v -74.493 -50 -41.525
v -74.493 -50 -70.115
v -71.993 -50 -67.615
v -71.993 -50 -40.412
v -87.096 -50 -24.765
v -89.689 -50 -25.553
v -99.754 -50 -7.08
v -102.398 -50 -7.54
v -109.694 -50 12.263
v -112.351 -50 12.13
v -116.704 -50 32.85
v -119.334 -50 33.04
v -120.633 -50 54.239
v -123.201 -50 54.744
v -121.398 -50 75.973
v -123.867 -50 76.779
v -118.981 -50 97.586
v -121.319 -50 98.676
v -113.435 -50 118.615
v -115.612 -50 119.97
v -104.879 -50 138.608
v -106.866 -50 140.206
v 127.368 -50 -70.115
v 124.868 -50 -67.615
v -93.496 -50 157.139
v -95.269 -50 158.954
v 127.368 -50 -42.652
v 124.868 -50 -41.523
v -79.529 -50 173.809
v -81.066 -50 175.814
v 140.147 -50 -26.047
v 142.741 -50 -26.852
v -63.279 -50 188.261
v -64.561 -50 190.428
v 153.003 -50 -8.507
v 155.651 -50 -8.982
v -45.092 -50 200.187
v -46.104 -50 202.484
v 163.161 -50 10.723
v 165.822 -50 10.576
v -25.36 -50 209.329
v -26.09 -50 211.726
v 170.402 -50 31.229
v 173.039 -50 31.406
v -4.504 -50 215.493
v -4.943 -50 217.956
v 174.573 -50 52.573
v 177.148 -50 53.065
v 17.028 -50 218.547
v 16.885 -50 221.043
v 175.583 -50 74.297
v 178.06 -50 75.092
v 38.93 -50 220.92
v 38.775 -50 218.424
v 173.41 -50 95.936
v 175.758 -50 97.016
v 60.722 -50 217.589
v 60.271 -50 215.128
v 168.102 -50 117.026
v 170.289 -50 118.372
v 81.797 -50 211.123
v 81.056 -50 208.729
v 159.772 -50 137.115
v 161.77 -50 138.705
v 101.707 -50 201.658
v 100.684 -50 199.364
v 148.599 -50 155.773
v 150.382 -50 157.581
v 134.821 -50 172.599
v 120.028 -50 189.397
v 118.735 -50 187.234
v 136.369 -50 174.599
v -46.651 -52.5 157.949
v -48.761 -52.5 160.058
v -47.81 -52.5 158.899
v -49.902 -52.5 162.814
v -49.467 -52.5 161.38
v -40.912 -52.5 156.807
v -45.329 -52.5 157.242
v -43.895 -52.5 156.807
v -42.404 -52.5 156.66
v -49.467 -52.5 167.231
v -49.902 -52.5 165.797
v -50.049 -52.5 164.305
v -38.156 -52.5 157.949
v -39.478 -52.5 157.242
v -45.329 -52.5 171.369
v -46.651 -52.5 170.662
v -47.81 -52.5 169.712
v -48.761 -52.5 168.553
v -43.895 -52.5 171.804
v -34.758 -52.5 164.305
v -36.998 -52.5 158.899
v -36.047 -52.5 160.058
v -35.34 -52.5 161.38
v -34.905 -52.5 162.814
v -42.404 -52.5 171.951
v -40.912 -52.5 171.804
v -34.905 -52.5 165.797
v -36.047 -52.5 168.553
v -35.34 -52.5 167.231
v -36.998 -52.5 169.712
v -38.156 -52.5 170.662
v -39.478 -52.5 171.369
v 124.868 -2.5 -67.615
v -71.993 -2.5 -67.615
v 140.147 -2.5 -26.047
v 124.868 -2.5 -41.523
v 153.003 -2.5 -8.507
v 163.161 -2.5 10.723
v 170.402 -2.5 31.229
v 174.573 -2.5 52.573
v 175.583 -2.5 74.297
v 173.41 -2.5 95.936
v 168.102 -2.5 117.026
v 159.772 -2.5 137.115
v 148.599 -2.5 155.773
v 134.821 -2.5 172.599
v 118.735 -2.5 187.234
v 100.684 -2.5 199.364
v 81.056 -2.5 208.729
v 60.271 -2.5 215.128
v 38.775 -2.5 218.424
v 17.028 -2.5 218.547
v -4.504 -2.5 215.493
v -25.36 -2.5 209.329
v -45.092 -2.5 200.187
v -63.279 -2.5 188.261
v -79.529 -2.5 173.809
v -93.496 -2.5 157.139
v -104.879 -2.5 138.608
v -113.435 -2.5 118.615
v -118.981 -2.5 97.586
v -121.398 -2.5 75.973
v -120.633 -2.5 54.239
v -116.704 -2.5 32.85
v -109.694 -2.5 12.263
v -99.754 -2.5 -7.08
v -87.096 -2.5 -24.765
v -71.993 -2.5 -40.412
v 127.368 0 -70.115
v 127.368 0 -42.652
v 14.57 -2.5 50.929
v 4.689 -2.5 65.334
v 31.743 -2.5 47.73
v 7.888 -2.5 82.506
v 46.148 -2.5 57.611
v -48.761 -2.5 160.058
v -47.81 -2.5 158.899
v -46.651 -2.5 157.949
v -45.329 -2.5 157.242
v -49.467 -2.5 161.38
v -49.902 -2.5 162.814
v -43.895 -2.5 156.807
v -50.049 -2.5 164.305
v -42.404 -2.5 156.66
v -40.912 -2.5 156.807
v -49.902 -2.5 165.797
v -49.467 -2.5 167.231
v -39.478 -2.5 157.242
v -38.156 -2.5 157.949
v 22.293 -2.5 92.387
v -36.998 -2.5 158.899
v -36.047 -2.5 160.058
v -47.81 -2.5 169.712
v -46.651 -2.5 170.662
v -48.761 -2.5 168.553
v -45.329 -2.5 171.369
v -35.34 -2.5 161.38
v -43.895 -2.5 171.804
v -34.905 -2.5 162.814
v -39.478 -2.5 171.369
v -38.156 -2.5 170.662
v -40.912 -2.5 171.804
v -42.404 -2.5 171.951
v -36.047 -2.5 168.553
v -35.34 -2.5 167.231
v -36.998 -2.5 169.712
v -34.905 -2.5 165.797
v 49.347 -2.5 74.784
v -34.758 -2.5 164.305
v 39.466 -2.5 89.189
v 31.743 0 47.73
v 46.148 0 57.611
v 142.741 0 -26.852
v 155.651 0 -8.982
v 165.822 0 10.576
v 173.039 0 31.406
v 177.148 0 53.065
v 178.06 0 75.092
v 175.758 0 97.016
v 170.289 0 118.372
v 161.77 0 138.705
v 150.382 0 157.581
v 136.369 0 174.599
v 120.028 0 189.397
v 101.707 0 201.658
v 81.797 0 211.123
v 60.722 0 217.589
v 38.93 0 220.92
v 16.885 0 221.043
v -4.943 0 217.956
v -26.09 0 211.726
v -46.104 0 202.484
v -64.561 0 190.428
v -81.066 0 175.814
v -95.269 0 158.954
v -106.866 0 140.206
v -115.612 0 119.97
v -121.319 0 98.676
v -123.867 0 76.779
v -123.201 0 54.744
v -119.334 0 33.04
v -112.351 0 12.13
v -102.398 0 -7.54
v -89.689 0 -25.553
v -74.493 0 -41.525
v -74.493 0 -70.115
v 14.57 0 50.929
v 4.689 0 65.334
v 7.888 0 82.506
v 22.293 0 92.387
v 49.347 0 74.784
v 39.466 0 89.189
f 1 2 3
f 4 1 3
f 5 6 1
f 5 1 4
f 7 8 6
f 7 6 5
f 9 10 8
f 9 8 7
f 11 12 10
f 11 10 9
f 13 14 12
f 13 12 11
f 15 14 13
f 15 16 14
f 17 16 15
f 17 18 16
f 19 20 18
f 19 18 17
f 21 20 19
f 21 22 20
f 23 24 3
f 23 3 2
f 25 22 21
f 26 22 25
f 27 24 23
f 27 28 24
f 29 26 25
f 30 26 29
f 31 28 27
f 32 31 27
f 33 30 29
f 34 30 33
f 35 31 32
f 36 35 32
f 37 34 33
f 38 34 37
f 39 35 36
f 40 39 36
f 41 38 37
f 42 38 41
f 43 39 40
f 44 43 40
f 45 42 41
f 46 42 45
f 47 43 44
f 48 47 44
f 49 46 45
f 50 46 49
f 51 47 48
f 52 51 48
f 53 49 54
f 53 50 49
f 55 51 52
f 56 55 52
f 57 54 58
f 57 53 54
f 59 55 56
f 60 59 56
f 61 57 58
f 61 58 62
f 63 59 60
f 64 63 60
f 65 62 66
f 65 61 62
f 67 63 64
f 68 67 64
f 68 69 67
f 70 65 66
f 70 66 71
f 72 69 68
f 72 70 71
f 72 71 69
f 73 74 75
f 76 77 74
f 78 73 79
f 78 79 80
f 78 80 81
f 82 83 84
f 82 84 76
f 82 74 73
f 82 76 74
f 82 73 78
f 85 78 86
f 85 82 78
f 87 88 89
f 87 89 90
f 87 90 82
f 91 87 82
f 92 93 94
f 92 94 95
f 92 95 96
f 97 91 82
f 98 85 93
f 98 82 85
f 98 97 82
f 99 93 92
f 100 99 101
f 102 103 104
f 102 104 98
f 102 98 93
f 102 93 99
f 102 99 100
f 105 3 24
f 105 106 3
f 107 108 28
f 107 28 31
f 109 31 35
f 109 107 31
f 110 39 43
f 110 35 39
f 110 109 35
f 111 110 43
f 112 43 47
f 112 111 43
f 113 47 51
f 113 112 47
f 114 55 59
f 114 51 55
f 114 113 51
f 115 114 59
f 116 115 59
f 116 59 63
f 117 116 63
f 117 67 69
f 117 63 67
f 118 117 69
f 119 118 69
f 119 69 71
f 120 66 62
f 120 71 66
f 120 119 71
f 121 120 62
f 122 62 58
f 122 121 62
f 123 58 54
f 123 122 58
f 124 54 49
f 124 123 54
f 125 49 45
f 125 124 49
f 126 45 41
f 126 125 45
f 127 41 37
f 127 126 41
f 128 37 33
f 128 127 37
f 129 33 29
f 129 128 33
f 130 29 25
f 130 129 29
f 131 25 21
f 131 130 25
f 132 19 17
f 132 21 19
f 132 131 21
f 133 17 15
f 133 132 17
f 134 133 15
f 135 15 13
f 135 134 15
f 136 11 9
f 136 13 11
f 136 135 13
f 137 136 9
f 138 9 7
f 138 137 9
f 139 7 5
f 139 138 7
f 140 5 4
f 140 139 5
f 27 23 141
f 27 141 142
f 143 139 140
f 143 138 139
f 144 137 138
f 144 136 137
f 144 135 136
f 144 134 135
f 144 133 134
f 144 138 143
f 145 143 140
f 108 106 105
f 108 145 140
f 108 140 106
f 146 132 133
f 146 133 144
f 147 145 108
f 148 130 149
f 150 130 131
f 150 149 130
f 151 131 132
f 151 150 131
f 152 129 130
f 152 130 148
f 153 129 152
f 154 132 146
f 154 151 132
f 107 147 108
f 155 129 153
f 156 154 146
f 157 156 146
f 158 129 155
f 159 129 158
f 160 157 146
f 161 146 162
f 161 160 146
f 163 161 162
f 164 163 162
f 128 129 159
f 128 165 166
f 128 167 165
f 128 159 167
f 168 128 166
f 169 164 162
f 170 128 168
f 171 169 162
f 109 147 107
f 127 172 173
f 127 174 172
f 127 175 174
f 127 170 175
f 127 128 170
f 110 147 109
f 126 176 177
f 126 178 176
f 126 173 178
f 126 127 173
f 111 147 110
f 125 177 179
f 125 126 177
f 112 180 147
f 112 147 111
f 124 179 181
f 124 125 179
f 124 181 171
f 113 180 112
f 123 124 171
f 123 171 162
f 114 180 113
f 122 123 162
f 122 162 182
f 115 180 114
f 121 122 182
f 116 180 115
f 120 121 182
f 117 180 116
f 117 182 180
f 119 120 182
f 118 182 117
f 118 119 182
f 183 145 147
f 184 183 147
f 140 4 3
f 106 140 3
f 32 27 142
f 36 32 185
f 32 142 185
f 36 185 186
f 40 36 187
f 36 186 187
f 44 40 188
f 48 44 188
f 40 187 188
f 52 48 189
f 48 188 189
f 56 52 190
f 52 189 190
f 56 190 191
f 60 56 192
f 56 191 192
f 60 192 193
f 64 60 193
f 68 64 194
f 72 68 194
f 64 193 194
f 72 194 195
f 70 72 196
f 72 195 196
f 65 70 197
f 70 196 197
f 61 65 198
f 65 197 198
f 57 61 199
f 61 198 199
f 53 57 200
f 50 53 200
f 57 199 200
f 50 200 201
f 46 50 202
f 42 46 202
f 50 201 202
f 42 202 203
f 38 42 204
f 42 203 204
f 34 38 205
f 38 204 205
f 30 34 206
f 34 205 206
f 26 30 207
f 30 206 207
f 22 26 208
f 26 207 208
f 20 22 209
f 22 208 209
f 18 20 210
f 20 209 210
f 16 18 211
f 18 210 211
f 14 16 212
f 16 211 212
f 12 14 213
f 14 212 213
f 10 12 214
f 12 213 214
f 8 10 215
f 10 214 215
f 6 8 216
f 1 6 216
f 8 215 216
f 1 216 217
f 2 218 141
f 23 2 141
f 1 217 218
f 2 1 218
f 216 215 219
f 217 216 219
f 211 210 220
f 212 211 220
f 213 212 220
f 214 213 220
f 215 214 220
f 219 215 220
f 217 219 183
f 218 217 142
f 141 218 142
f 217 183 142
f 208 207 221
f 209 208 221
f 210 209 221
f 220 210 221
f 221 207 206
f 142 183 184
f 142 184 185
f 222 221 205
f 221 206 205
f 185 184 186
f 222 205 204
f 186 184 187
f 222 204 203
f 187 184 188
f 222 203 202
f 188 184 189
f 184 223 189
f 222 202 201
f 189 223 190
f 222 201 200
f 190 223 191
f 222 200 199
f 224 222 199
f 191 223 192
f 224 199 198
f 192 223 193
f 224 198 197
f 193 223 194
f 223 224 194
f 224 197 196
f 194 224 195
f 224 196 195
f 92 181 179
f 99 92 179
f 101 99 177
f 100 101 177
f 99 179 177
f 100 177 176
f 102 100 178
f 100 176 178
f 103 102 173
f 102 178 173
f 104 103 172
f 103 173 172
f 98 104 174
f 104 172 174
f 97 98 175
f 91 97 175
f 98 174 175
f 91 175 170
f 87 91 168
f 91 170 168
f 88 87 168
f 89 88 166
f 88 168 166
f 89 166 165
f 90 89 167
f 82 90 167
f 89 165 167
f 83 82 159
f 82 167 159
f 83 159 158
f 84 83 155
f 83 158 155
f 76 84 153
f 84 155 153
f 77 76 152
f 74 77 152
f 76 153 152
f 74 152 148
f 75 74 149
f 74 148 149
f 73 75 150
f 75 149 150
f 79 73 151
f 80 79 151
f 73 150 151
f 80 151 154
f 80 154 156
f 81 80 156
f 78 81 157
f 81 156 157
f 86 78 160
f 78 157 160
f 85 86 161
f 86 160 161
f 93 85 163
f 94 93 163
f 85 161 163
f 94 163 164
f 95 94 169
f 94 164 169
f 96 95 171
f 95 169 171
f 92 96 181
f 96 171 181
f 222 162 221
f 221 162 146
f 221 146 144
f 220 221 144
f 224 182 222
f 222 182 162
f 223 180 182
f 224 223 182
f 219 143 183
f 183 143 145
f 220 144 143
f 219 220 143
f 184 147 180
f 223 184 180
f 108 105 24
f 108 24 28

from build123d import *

# Parameters (mm, degrees)
F0_R      = 38.1036206278
F1_DEPTH  = 25
F2_COUNT  = 24
F3_DEPTH  = 35
F4_R      = 5
F5_SIZE   = 5
F7_DEPTH  = 50
F8_T      = -2.5
F10_DEPTH = 25
F11_R     = 7.6453811345
F12_DEPTH = 50


with BuildPart() as f1:
    # F0 (on Front) → F1 (new body)
    with BuildSketch(Plane.XZ):
        with BuildLine():
            ThreePointArc((-7.8842675869, 53.139290225), (-35.0884247435, -40.6785974441), (53.721, 0))
            ThreePointArc((53.721, 0), (38.2966086664, 37.6738052983), (0.8807473744, 53.7137796572))
            ThreePointArc((0.8807473744, 53.7137796572), (-3.5135215054, 53.6059792153), (-7.8842675869, 53.139290225))
        make_face()
        Circle(F0_R, mode=Mode.SUBTRACT)
        with BuildLine():
            ThreePointArc((-7.8842675869, 53.139290225), (-3.5135215054, 53.6059792153), (0.8807473744, 53.7137796572))
            ThreePointArc((0.8807473744, 53.7137796572), (0.6904629861, 56.2382962215), (0, 58.674))
            ThreePointArc((0, 58.674), (-1.2045880723, 61.1890122015), (-2.8564405638, 63.4357213824))
            ThreePointArc((-2.8564405638, 63.4357213824), (-4.0797358778, 62.2447411623), (-5.448019844, 63.2658603022))
            ThreePointArc((-5.448019844, 63.2658603022), (-6.792486114, 60.822762014), (-7.6584938023, 58.1720357962))
            ThreePointArc((-7.6584938023, 58.1720357962), (-8.0251266423, 55.6670462968), (-7.8842675869, 53.139290225))
        make_face()
    extrude(amount=F1_DEPTH)


with BuildPart() as f2_1:
    # F2: instance of F1
    add(f1.part.rotate(Axis((0, 0, 0), (0, 1, 0)), 1 * 360 / F2_COUNT))


with BuildPart() as f2_2:
    # F2: instance of F1
    add(f1.part.rotate(Axis((0, 0, 0), (0, 1, 0)), 2 * 360 / F2_COUNT))


with BuildPart() as f2_3:
    # F2: instance of F1
    add(f1.part.rotate(Axis((0, 0, 0), (0, 1, 0)), 3 * 360 / F2_COUNT))


with BuildPart() as f2_4:
    # F2: instance of F1
    add(f1.part.rotate(Axis((0, 0, 0), (0, 1, 0)), 4 * 360 / F2_COUNT))


with BuildPart() as f2_5:
    # F2: instance of F1
    add(f1.part.rotate(Axis((0, 0, 0), (0, 1, 0)), 5 * 360 / F2_COUNT))


with BuildPart() as f2_6:
    # F2: instance of F1
    add(f1.part.rotate(Axis((0, 0, 0), (0, 1, 0)), 6 * 360 / F2_COUNT))


with BuildPart() as f2_7:
    # F2: instance of F1
    add(f1.part.rotate(Axis((0, 0, 0), (0, 1, 0)), 7 * 360 / F2_COUNT))


with BuildPart() as f2_8:
    # F2: instance of F1
    add(f1.part.rotate(Axis((0, 0, 0), (0, 1, 0)), 8 * 360 / F2_COUNT))


with BuildPart() as f2_9:
    # F2: instance of F1
    add(f1.part.rotate(Axis((0, 0, 0), (0, 1, 0)), 9 * 360 / F2_COUNT))


with BuildPart() as f2_10:
    # F2: instance of F1
    add(f1.part.rotate(Axis((0, 0, 0), (0, 1, 0)), 10 * 360 / F2_COUNT))


with BuildPart() as f2_11:
    # F2: instance of F1
    add(f1.part.rotate(Axis((0, 0, 0), (0, 1, 0)), 11 * 360 / F2_COUNT))


with BuildPart() as f2_12:
    # F2: instance of F1
    add(f1.part.rotate(Axis((0, 0, 0), (0, 1, 0)), 12 * 360 / F2_COUNT))


with BuildPart() as f2_13:
    # F2: instance of F1
    add(f1.part.rotate(Axis((0, 0, 0), (0, 1, 0)), 13 * 360 / F2_COUNT))


with BuildPart() as f2_14:
    # F2: instance of F1
    add(f1.part.rotate(Axis((0, 0, 0), (0, 1, 0)), 14 * 360 / F2_COUNT))


with BuildPart() as f2_15:
    # F2: instance of F1
    add(f1.part.rotate(Axis((0, 0, 0), (0, 1, 0)), 15 * 360 / F2_COUNT))


with BuildPart() as f2_16:
    # F2: instance of F1
    add(f1.part.rotate(Axis((0, 0, 0), (0, 1, 0)), 16 * 360 / F2_COUNT))


with BuildPart() as f2_17:
    # F2: instance of F1
    add(f1.part.rotate(Axis((0, 0, 0), (0, 1, 0)), 17 * 360 / F2_COUNT))


with BuildPart() as f2_18:
    # F2: instance of F1
    add(f1.part.rotate(Axis((0, 0, 0), (0, 1, 0)), 18 * 360 / F2_COUNT))


with BuildPart() as f2_19:
    # F2: instance of F1
    add(f1.part.rotate(Axis((0, 0, 0), (0, 1, 0)), 19 * 360 / F2_COUNT))


with BuildPart() as f2_20:
    # F2: instance of F1
    add(f1.part.rotate(Axis((0, 0, 0), (0, 1, 0)), 20 * 360 / F2_COUNT))


with BuildPart() as f2_21:
    # F2: instance of F1
    add(f1.part.rotate(Axis((0, 0, 0), (0, 1, 0)), 21 * 360 / F2_COUNT))


with BuildPart() as f2_22:
    # F2: instance of F1
    add(f1.part.rotate(Axis((0, 0, 0), (0, 1, 0)), 22 * 360 / F2_COUNT))


with BuildPart() as f2_23:
    # F2: instance of F1
    add(f1.part.rotate(Axis((0, 0, 0), (0, 1, 0)), 23 * 360 / F2_COUNT))


with BuildPart() as f1_1:
    add(f1.part)

    add(f2_1.part)  # F3 merges F2_1

    add(f2_2.part)  # F3 merges F2_2

    add(f2_3.part)  # F3 merges F2_3

    add(f2_4.part)  # F3 merges F2_4

    add(f2_5.part)  # F3 merges F2_5

    add(f2_6.part)  # F3 merges F2_6

    add(f2_7.part)  # F3 merges F2_7

    add(f2_8.part)  # F3 merges F2_8

    add(f2_9.part)  # F3 merges F2_9

    add(f2_10.part)  # F3 merges F2_10

    add(f2_11.part)  # F3 merges F2_11

    add(f2_12.part)  # F3 merges F2_12

    add(f2_13.part)  # F3 merges F2_13

    add(f2_14.part)  # F3 merges F2_14

    add(f2_15.part)  # F3 merges F2_15

    add(f2_16.part)  # F3 merges F2_16

    add(f2_17.part)  # F3 merges F2_17

    add(f2_18.part)  # F3 merges F2_18

    add(f2_19.part)  # F3 merges F2_19

    add(f2_20.part)  # F3 merges F2_20

    add(f2_21.part)  # F3 merges F2_21

    add(f2_22.part)  # F3 merges F2_22

    add(f2_23.part)  # F3 merges F2_23
    # F0 (on Front) → F3 (join)
    with BuildSketch(Plane.XZ):
        Circle(F0_R)
        Polygon((22.3287471763, 4.725022344), (19.1299038845, -12.447713203), (4.725022344, -22.3287471763), (-12.447713203, -19.1299038845), (-22.3287471763, -4.725022344), (-19.1299038845, 12.447713203), (-4.725022344, 22.3287471763), (12.447713203, 19.1299038845), align=None, mode=Mode.SUBTRACT)
    extrude(amount=F3_DEPTH)

    # F4
    f4_edges = [f1_1.edges().sort_by_distance(p)[0] for p in [
        (-38.103621, -35, 0),
        (3.861345, -35, 20.729326),
        (17.38823, -35, 11.927463),
        (20.729326, -35, -3.861345),
        (11.927463, -35, -17.38823),
        (-3.861345, -35, -20.729326),
        (-17.38823, -35, -11.927463),
        (-20.729326, -35, 3.861345),
        (-11.927463, -35, 17.38823),
    ]]
    fillet(f4_edges, radius=F4_R)

    # F5
    f5_edges = [f1_1.edges().sort_by_distance(p)[0] for p in [
        (-33.103621, -35, 0),
        (4.776968, -35, 25.644774),
        (-14.755767, -35, 21.51142),
        (21.51142, -35, 14.755767),
        (-25.644774, -35, 4.776968),
        (25.644774, -35, -4.776968),
        (-21.51142, -35, -14.755767),
        (14.755767, -35, -21.51142),
        (-4.776968, -35, -25.644774),
        (36.639155, -33.535534, 0),
        (-38.103621, -30, 0),
        (-23.954189, -33.604656, -5.068985),
        (-20.729326, -30, 3.861345),
        (-20.522483, -33.604656, 13.353856),
        (-11.927463, -30, 17.38823),
        (-5.068985, -33.604656, 23.954189),
        (3.861345, -30, 20.729326),
        (13.353856, -33.604656, 20.522483),
        (17.38823, -30, 11.927463),
        (23.954189, -33.604656, 5.068985),
        (20.729326, -30, -3.861345),
        (20.522483, -33.604656, -13.353856),
        (11.927463, -30, -17.38823),
        (5.068985, -33.604656, -23.954189),
        (-3.861345, -30, -20.729326),
        (-13.353856, -33.604656, -20.522483),
        (-17.38823, -30, -11.927463),
    ]]
    chamfer(f5_edges, length=F5_SIZE)

    # F6 (on Front) → F7 (join)
    with BuildSketch(Plane.XZ):
        with BuildLine():
            ThreePointArc((127.3675560951, -42.6523669827), (27.9093520111, 221.3839321935), (-74.4929984212, -41.5245314744))
            Line((-74.4929984212, -41.5245314744), (-74.4929984212, -70.1153203845))
            Line((-74.4929984212, -70.1153203845), (127.3675560951, -70.1153203845))
            Line((127.3675560951, -70.1153203845), (127.3675560951, -42.6523669827))
        make_face()
    extrude(amount=F7_DEPTH)

    # F8
    f8_openings = [f1_1.faces().sort_by_distance(p)[0] for p in [
        (27.015959, -50, 69.902767),
    ]]
    offset(amount=F8_T, openings=f8_openings, kind=Kind.INTERSECTION)

    # F9 (on face) → F10 (cut)
    with BuildSketch(Plane.XZ.offset(2.5)):
        Polygon((31.7429648501, 47.7299130723), (46.1478463905, 57.6109470455), (49.3466896824, 74.7836825926), (39.4656557091, 89.1885641331), (22.292920162, 92.3874074249), (7.8880386215, 82.5063734516), (4.6891953297, 65.3336379045), (14.570229303, 50.9287563641), align=None)
    extrude(amount=-F10_DEPTH, mode=Mode.SUBTRACT)

    # F11 (on face) → F12 (join)
    with BuildSketch(Plane.XZ.offset(2.5)):
        with Locations((-42.4036420882, 164.3054187298)):
            Circle(F11_R)
    extrude(amount=F12_DEPTH)


solid = f1_1.part
